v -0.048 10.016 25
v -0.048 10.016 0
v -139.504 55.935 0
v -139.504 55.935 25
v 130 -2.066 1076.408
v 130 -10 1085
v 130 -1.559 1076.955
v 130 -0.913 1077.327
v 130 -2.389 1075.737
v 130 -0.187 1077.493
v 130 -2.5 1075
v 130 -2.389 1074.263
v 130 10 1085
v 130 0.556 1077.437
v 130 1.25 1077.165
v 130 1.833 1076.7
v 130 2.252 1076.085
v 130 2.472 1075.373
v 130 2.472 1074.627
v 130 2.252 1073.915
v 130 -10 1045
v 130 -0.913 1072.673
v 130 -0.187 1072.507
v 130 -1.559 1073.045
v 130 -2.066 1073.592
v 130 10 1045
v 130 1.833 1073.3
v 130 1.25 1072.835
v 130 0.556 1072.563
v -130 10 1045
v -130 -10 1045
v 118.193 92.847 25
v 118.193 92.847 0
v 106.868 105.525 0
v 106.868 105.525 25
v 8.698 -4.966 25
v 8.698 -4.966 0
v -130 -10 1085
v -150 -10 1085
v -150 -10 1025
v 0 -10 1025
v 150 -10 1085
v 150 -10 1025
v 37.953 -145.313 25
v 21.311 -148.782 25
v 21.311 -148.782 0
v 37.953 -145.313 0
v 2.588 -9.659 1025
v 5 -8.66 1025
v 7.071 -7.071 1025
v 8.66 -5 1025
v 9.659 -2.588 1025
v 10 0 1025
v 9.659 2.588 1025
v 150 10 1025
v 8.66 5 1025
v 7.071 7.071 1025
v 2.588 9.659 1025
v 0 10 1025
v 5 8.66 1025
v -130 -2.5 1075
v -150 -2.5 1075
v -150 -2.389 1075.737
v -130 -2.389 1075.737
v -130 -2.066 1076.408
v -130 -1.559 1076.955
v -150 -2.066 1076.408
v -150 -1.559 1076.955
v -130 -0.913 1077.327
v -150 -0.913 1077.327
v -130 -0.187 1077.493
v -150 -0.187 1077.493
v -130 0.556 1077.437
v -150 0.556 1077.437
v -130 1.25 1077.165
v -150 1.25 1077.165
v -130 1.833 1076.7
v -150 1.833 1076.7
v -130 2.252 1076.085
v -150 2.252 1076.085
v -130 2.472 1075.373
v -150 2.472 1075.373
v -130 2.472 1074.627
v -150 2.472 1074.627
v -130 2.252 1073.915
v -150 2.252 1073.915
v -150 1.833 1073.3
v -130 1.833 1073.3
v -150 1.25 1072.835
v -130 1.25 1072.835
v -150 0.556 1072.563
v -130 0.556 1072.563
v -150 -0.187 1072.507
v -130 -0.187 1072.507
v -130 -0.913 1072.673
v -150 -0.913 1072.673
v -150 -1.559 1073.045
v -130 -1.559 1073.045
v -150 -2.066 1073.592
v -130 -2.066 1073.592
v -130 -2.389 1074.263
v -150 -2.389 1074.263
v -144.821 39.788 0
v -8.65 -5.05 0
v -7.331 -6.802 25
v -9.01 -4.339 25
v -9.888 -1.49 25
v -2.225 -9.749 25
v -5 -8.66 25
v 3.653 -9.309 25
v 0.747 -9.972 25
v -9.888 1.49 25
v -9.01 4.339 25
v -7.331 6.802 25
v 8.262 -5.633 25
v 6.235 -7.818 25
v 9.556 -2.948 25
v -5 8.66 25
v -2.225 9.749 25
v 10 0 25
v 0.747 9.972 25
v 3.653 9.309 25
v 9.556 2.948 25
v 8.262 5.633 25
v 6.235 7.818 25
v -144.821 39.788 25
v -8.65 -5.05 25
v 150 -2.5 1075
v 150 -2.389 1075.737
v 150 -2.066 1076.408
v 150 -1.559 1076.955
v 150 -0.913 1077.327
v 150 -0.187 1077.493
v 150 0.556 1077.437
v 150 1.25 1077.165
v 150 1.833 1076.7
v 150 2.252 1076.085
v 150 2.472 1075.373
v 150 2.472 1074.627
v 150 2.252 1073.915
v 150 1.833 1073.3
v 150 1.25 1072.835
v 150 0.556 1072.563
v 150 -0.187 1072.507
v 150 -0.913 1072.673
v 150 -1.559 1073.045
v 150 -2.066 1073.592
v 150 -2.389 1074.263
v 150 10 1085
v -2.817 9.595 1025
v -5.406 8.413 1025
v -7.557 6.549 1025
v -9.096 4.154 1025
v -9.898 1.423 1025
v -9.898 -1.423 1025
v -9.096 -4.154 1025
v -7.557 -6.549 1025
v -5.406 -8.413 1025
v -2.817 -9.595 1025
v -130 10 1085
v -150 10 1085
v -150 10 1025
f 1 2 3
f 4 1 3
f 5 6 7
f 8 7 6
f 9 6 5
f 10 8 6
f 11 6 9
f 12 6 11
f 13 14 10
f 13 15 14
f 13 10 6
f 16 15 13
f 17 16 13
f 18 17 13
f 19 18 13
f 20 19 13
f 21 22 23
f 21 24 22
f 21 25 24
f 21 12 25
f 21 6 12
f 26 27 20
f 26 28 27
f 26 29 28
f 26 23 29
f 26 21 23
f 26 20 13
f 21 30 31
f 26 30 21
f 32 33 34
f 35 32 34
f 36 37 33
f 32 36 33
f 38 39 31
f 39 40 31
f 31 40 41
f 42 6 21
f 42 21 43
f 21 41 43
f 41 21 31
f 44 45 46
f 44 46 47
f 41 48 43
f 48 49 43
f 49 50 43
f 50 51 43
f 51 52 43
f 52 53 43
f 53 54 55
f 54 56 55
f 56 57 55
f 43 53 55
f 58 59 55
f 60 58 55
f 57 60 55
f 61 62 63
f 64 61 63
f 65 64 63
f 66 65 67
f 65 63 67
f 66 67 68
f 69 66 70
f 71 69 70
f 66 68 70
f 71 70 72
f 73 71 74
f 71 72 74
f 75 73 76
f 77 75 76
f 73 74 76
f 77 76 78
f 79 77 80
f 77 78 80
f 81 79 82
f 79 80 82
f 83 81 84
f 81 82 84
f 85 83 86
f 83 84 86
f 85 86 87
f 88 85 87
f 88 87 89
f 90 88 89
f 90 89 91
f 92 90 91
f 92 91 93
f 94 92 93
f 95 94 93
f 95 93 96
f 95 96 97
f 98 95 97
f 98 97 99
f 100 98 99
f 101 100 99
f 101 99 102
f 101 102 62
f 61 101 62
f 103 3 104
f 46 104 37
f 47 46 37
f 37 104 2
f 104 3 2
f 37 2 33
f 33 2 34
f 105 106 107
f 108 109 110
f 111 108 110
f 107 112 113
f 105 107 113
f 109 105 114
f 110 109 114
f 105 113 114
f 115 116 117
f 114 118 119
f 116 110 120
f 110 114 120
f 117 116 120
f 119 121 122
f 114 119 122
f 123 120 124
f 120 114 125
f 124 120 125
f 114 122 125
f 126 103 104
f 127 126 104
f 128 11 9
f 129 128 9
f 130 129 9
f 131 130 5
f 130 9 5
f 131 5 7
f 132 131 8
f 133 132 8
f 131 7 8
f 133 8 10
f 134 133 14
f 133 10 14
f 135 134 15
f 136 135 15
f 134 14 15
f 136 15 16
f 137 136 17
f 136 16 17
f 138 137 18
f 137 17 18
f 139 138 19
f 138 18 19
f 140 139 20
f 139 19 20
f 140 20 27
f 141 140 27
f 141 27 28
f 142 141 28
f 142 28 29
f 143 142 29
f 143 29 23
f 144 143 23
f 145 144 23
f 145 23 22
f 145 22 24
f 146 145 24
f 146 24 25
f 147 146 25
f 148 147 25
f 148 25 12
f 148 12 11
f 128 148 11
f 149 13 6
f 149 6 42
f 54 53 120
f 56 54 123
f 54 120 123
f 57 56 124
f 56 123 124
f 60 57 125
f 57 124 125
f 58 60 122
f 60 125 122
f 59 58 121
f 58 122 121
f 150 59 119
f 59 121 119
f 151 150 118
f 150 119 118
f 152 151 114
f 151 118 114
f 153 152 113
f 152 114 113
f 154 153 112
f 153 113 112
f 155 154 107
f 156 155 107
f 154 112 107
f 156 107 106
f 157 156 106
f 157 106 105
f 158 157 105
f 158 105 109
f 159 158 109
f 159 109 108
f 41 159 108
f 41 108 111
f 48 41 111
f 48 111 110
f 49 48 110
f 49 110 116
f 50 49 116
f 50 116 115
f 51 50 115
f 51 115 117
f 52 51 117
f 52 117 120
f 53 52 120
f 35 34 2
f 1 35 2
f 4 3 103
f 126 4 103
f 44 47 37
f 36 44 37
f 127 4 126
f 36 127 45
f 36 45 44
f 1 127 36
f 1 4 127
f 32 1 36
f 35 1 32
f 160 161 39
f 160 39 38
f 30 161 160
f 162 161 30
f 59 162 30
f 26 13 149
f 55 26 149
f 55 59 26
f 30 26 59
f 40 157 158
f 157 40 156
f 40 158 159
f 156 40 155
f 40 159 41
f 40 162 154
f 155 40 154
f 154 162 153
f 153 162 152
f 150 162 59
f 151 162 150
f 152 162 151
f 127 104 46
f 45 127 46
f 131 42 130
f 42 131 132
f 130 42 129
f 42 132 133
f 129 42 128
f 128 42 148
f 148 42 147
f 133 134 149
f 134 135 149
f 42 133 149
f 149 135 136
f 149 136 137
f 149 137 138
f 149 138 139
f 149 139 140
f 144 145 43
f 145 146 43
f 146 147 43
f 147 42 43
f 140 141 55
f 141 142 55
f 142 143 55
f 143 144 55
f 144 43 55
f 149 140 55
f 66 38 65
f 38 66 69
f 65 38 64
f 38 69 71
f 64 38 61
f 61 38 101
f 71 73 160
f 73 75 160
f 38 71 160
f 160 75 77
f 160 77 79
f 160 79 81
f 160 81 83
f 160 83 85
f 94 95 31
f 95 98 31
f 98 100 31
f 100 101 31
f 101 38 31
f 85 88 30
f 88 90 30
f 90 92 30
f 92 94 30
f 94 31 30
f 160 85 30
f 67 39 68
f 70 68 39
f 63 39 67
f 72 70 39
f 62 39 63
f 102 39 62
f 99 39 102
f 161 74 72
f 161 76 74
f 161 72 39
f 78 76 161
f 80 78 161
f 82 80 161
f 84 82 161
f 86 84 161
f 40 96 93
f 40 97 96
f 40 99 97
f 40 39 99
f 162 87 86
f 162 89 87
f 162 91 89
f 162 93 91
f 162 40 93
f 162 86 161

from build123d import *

# Parameters (mm, degrees)
F1_DEPTH = 25
F2_R     = 10
F3_DEPTH = 1000
F4_W     = 300
F4_H     = 20
F5_DEPTH = 20
F6_W     = 20
F6_H     = 20
F7_DEPTH = 40
F8_R     = 2.5
F9_DEPTH = 500


with BuildPart() as f1:
    # F0 (on Top) → F1 (new body)
    with BuildSketch(Plane.XY):
        Polygon((37.9534393111, -145.3128050793), (8.6981086691, -4.9661840892), (118.1933215466, 92.8469560027), (106.8678610383, 105.5250451441), (-0.0482127534, 10.0158751169), (-139.5044833357, 55.9349410156), (-144.8213003494, 39.7877599353), (-8.6498959157, -5.0496910277), (21.3111617891, -148.7818970183), align=None)
        with BuildLine():
            Line((-8.6269494076, -5.0572466738), (-8.6498959157, -5.0496910277))
            Line((-8.6498959157, -5.0496910277), (-8.6602540378, -5))
            ThreePointArc((-8.6602540378, -5), (-8.6436491157, -5.0286509089), (-8.6269494076, -5.0572466738))
        make_face(mode=Mode.SUBTRACT)
        with BuildLine():
            Line((-0.0662293889, 9.999780681), (-0.0482127534, 10.0158751169))
            Line((-0.0482127534, 10.0158751169), (0, 10))
            ThreePointArc((0, 10), (-0.033114876, 9.9999451701), (-0.0662293889, 9.999780681))
        make_face(mode=Mode.SUBTRACT)
        with BuildLine():
            Line((8.6981086691, -4.9661840892), (8.6602540378, -5))
            ThreePointArc((8.6602540378, -5), (8.6767639918, -4.9712942612), (8.6931787965, -4.9425340072))
            Line((8.6931787965, -4.9425340072), (8.6981086691, -4.9661840892))
        make_face(mode=Mode.SUBTRACT)
        with BuildLine():
            Line((0, 10), (-0.0482127534, 10.0158751169))
            Line((-0.0482127534, 10.0158751169), (-0.0662293889, 9.999780681))
            ThreePointArc((-0.0662293889, 9.999780681), (-0.033114876, 9.9999451701), (0, 10))
        make_face()
        with BuildLine():
            Line((-8.6602540378, -5), (-8.6498959157, -5.0496910277))
            Line((-8.6498959157, -5.0496910277), (-8.6269494076, -5.0572466738))
            ThreePointArc((-8.6269494076, -5.0572466738), (-8.6436491157, -5.0286509089), (-8.6602540378, -5))
        make_face()
        with BuildLine():
            ThreePointArc((8.6931787965, -4.9425340072), (8.6767639918, -4.9712942612), (8.6602540378, -5))
            Line((8.6602540378, -5), (8.6981086691, -4.9661840892))
            Line((8.6981086691, -4.9661840892), (8.6931787965, -4.9425340072))
        make_face()
    extrude(amount=F1_DEPTH)


with BuildPart() as f3:
    # F2 (on face) → F3 (new body)
    with BuildSketch(Plane.XY.offset(25)):
        Circle(F2_R)
    extrude(amount=F3_DEPTH)

    # F4 (on face) → F5 (join)
    with BuildSketch(Plane.XY.offset(1025)):
        Rectangle(F4_W, F4_H)
    extrude(amount=F5_DEPTH)

    # F6 (on face) → F7 (join)
    with BuildSketch(Plane.XY.offset(1045)):
        with Locations((-140, 0)):
            Rectangle(F6_W, F6_H)
        with Locations((140, 0)):
            Rectangle(F6_W, F6_H)
    extrude(amount=F7_DEPTH)

    # F8 (on face) → F9 (cut)
    with BuildSketch(Plane(origin=(-150, 0, 0), x_dir=(0, -1, 0), z_dir=(-1, 0, 0))):
        with Locations((0, 1075)):
            Circle(F8_R)
    extrude(amount=-F9_DEPTH, mode=Mode.SUBTRACT)


solid = Compound([f1.part, f3.part])
